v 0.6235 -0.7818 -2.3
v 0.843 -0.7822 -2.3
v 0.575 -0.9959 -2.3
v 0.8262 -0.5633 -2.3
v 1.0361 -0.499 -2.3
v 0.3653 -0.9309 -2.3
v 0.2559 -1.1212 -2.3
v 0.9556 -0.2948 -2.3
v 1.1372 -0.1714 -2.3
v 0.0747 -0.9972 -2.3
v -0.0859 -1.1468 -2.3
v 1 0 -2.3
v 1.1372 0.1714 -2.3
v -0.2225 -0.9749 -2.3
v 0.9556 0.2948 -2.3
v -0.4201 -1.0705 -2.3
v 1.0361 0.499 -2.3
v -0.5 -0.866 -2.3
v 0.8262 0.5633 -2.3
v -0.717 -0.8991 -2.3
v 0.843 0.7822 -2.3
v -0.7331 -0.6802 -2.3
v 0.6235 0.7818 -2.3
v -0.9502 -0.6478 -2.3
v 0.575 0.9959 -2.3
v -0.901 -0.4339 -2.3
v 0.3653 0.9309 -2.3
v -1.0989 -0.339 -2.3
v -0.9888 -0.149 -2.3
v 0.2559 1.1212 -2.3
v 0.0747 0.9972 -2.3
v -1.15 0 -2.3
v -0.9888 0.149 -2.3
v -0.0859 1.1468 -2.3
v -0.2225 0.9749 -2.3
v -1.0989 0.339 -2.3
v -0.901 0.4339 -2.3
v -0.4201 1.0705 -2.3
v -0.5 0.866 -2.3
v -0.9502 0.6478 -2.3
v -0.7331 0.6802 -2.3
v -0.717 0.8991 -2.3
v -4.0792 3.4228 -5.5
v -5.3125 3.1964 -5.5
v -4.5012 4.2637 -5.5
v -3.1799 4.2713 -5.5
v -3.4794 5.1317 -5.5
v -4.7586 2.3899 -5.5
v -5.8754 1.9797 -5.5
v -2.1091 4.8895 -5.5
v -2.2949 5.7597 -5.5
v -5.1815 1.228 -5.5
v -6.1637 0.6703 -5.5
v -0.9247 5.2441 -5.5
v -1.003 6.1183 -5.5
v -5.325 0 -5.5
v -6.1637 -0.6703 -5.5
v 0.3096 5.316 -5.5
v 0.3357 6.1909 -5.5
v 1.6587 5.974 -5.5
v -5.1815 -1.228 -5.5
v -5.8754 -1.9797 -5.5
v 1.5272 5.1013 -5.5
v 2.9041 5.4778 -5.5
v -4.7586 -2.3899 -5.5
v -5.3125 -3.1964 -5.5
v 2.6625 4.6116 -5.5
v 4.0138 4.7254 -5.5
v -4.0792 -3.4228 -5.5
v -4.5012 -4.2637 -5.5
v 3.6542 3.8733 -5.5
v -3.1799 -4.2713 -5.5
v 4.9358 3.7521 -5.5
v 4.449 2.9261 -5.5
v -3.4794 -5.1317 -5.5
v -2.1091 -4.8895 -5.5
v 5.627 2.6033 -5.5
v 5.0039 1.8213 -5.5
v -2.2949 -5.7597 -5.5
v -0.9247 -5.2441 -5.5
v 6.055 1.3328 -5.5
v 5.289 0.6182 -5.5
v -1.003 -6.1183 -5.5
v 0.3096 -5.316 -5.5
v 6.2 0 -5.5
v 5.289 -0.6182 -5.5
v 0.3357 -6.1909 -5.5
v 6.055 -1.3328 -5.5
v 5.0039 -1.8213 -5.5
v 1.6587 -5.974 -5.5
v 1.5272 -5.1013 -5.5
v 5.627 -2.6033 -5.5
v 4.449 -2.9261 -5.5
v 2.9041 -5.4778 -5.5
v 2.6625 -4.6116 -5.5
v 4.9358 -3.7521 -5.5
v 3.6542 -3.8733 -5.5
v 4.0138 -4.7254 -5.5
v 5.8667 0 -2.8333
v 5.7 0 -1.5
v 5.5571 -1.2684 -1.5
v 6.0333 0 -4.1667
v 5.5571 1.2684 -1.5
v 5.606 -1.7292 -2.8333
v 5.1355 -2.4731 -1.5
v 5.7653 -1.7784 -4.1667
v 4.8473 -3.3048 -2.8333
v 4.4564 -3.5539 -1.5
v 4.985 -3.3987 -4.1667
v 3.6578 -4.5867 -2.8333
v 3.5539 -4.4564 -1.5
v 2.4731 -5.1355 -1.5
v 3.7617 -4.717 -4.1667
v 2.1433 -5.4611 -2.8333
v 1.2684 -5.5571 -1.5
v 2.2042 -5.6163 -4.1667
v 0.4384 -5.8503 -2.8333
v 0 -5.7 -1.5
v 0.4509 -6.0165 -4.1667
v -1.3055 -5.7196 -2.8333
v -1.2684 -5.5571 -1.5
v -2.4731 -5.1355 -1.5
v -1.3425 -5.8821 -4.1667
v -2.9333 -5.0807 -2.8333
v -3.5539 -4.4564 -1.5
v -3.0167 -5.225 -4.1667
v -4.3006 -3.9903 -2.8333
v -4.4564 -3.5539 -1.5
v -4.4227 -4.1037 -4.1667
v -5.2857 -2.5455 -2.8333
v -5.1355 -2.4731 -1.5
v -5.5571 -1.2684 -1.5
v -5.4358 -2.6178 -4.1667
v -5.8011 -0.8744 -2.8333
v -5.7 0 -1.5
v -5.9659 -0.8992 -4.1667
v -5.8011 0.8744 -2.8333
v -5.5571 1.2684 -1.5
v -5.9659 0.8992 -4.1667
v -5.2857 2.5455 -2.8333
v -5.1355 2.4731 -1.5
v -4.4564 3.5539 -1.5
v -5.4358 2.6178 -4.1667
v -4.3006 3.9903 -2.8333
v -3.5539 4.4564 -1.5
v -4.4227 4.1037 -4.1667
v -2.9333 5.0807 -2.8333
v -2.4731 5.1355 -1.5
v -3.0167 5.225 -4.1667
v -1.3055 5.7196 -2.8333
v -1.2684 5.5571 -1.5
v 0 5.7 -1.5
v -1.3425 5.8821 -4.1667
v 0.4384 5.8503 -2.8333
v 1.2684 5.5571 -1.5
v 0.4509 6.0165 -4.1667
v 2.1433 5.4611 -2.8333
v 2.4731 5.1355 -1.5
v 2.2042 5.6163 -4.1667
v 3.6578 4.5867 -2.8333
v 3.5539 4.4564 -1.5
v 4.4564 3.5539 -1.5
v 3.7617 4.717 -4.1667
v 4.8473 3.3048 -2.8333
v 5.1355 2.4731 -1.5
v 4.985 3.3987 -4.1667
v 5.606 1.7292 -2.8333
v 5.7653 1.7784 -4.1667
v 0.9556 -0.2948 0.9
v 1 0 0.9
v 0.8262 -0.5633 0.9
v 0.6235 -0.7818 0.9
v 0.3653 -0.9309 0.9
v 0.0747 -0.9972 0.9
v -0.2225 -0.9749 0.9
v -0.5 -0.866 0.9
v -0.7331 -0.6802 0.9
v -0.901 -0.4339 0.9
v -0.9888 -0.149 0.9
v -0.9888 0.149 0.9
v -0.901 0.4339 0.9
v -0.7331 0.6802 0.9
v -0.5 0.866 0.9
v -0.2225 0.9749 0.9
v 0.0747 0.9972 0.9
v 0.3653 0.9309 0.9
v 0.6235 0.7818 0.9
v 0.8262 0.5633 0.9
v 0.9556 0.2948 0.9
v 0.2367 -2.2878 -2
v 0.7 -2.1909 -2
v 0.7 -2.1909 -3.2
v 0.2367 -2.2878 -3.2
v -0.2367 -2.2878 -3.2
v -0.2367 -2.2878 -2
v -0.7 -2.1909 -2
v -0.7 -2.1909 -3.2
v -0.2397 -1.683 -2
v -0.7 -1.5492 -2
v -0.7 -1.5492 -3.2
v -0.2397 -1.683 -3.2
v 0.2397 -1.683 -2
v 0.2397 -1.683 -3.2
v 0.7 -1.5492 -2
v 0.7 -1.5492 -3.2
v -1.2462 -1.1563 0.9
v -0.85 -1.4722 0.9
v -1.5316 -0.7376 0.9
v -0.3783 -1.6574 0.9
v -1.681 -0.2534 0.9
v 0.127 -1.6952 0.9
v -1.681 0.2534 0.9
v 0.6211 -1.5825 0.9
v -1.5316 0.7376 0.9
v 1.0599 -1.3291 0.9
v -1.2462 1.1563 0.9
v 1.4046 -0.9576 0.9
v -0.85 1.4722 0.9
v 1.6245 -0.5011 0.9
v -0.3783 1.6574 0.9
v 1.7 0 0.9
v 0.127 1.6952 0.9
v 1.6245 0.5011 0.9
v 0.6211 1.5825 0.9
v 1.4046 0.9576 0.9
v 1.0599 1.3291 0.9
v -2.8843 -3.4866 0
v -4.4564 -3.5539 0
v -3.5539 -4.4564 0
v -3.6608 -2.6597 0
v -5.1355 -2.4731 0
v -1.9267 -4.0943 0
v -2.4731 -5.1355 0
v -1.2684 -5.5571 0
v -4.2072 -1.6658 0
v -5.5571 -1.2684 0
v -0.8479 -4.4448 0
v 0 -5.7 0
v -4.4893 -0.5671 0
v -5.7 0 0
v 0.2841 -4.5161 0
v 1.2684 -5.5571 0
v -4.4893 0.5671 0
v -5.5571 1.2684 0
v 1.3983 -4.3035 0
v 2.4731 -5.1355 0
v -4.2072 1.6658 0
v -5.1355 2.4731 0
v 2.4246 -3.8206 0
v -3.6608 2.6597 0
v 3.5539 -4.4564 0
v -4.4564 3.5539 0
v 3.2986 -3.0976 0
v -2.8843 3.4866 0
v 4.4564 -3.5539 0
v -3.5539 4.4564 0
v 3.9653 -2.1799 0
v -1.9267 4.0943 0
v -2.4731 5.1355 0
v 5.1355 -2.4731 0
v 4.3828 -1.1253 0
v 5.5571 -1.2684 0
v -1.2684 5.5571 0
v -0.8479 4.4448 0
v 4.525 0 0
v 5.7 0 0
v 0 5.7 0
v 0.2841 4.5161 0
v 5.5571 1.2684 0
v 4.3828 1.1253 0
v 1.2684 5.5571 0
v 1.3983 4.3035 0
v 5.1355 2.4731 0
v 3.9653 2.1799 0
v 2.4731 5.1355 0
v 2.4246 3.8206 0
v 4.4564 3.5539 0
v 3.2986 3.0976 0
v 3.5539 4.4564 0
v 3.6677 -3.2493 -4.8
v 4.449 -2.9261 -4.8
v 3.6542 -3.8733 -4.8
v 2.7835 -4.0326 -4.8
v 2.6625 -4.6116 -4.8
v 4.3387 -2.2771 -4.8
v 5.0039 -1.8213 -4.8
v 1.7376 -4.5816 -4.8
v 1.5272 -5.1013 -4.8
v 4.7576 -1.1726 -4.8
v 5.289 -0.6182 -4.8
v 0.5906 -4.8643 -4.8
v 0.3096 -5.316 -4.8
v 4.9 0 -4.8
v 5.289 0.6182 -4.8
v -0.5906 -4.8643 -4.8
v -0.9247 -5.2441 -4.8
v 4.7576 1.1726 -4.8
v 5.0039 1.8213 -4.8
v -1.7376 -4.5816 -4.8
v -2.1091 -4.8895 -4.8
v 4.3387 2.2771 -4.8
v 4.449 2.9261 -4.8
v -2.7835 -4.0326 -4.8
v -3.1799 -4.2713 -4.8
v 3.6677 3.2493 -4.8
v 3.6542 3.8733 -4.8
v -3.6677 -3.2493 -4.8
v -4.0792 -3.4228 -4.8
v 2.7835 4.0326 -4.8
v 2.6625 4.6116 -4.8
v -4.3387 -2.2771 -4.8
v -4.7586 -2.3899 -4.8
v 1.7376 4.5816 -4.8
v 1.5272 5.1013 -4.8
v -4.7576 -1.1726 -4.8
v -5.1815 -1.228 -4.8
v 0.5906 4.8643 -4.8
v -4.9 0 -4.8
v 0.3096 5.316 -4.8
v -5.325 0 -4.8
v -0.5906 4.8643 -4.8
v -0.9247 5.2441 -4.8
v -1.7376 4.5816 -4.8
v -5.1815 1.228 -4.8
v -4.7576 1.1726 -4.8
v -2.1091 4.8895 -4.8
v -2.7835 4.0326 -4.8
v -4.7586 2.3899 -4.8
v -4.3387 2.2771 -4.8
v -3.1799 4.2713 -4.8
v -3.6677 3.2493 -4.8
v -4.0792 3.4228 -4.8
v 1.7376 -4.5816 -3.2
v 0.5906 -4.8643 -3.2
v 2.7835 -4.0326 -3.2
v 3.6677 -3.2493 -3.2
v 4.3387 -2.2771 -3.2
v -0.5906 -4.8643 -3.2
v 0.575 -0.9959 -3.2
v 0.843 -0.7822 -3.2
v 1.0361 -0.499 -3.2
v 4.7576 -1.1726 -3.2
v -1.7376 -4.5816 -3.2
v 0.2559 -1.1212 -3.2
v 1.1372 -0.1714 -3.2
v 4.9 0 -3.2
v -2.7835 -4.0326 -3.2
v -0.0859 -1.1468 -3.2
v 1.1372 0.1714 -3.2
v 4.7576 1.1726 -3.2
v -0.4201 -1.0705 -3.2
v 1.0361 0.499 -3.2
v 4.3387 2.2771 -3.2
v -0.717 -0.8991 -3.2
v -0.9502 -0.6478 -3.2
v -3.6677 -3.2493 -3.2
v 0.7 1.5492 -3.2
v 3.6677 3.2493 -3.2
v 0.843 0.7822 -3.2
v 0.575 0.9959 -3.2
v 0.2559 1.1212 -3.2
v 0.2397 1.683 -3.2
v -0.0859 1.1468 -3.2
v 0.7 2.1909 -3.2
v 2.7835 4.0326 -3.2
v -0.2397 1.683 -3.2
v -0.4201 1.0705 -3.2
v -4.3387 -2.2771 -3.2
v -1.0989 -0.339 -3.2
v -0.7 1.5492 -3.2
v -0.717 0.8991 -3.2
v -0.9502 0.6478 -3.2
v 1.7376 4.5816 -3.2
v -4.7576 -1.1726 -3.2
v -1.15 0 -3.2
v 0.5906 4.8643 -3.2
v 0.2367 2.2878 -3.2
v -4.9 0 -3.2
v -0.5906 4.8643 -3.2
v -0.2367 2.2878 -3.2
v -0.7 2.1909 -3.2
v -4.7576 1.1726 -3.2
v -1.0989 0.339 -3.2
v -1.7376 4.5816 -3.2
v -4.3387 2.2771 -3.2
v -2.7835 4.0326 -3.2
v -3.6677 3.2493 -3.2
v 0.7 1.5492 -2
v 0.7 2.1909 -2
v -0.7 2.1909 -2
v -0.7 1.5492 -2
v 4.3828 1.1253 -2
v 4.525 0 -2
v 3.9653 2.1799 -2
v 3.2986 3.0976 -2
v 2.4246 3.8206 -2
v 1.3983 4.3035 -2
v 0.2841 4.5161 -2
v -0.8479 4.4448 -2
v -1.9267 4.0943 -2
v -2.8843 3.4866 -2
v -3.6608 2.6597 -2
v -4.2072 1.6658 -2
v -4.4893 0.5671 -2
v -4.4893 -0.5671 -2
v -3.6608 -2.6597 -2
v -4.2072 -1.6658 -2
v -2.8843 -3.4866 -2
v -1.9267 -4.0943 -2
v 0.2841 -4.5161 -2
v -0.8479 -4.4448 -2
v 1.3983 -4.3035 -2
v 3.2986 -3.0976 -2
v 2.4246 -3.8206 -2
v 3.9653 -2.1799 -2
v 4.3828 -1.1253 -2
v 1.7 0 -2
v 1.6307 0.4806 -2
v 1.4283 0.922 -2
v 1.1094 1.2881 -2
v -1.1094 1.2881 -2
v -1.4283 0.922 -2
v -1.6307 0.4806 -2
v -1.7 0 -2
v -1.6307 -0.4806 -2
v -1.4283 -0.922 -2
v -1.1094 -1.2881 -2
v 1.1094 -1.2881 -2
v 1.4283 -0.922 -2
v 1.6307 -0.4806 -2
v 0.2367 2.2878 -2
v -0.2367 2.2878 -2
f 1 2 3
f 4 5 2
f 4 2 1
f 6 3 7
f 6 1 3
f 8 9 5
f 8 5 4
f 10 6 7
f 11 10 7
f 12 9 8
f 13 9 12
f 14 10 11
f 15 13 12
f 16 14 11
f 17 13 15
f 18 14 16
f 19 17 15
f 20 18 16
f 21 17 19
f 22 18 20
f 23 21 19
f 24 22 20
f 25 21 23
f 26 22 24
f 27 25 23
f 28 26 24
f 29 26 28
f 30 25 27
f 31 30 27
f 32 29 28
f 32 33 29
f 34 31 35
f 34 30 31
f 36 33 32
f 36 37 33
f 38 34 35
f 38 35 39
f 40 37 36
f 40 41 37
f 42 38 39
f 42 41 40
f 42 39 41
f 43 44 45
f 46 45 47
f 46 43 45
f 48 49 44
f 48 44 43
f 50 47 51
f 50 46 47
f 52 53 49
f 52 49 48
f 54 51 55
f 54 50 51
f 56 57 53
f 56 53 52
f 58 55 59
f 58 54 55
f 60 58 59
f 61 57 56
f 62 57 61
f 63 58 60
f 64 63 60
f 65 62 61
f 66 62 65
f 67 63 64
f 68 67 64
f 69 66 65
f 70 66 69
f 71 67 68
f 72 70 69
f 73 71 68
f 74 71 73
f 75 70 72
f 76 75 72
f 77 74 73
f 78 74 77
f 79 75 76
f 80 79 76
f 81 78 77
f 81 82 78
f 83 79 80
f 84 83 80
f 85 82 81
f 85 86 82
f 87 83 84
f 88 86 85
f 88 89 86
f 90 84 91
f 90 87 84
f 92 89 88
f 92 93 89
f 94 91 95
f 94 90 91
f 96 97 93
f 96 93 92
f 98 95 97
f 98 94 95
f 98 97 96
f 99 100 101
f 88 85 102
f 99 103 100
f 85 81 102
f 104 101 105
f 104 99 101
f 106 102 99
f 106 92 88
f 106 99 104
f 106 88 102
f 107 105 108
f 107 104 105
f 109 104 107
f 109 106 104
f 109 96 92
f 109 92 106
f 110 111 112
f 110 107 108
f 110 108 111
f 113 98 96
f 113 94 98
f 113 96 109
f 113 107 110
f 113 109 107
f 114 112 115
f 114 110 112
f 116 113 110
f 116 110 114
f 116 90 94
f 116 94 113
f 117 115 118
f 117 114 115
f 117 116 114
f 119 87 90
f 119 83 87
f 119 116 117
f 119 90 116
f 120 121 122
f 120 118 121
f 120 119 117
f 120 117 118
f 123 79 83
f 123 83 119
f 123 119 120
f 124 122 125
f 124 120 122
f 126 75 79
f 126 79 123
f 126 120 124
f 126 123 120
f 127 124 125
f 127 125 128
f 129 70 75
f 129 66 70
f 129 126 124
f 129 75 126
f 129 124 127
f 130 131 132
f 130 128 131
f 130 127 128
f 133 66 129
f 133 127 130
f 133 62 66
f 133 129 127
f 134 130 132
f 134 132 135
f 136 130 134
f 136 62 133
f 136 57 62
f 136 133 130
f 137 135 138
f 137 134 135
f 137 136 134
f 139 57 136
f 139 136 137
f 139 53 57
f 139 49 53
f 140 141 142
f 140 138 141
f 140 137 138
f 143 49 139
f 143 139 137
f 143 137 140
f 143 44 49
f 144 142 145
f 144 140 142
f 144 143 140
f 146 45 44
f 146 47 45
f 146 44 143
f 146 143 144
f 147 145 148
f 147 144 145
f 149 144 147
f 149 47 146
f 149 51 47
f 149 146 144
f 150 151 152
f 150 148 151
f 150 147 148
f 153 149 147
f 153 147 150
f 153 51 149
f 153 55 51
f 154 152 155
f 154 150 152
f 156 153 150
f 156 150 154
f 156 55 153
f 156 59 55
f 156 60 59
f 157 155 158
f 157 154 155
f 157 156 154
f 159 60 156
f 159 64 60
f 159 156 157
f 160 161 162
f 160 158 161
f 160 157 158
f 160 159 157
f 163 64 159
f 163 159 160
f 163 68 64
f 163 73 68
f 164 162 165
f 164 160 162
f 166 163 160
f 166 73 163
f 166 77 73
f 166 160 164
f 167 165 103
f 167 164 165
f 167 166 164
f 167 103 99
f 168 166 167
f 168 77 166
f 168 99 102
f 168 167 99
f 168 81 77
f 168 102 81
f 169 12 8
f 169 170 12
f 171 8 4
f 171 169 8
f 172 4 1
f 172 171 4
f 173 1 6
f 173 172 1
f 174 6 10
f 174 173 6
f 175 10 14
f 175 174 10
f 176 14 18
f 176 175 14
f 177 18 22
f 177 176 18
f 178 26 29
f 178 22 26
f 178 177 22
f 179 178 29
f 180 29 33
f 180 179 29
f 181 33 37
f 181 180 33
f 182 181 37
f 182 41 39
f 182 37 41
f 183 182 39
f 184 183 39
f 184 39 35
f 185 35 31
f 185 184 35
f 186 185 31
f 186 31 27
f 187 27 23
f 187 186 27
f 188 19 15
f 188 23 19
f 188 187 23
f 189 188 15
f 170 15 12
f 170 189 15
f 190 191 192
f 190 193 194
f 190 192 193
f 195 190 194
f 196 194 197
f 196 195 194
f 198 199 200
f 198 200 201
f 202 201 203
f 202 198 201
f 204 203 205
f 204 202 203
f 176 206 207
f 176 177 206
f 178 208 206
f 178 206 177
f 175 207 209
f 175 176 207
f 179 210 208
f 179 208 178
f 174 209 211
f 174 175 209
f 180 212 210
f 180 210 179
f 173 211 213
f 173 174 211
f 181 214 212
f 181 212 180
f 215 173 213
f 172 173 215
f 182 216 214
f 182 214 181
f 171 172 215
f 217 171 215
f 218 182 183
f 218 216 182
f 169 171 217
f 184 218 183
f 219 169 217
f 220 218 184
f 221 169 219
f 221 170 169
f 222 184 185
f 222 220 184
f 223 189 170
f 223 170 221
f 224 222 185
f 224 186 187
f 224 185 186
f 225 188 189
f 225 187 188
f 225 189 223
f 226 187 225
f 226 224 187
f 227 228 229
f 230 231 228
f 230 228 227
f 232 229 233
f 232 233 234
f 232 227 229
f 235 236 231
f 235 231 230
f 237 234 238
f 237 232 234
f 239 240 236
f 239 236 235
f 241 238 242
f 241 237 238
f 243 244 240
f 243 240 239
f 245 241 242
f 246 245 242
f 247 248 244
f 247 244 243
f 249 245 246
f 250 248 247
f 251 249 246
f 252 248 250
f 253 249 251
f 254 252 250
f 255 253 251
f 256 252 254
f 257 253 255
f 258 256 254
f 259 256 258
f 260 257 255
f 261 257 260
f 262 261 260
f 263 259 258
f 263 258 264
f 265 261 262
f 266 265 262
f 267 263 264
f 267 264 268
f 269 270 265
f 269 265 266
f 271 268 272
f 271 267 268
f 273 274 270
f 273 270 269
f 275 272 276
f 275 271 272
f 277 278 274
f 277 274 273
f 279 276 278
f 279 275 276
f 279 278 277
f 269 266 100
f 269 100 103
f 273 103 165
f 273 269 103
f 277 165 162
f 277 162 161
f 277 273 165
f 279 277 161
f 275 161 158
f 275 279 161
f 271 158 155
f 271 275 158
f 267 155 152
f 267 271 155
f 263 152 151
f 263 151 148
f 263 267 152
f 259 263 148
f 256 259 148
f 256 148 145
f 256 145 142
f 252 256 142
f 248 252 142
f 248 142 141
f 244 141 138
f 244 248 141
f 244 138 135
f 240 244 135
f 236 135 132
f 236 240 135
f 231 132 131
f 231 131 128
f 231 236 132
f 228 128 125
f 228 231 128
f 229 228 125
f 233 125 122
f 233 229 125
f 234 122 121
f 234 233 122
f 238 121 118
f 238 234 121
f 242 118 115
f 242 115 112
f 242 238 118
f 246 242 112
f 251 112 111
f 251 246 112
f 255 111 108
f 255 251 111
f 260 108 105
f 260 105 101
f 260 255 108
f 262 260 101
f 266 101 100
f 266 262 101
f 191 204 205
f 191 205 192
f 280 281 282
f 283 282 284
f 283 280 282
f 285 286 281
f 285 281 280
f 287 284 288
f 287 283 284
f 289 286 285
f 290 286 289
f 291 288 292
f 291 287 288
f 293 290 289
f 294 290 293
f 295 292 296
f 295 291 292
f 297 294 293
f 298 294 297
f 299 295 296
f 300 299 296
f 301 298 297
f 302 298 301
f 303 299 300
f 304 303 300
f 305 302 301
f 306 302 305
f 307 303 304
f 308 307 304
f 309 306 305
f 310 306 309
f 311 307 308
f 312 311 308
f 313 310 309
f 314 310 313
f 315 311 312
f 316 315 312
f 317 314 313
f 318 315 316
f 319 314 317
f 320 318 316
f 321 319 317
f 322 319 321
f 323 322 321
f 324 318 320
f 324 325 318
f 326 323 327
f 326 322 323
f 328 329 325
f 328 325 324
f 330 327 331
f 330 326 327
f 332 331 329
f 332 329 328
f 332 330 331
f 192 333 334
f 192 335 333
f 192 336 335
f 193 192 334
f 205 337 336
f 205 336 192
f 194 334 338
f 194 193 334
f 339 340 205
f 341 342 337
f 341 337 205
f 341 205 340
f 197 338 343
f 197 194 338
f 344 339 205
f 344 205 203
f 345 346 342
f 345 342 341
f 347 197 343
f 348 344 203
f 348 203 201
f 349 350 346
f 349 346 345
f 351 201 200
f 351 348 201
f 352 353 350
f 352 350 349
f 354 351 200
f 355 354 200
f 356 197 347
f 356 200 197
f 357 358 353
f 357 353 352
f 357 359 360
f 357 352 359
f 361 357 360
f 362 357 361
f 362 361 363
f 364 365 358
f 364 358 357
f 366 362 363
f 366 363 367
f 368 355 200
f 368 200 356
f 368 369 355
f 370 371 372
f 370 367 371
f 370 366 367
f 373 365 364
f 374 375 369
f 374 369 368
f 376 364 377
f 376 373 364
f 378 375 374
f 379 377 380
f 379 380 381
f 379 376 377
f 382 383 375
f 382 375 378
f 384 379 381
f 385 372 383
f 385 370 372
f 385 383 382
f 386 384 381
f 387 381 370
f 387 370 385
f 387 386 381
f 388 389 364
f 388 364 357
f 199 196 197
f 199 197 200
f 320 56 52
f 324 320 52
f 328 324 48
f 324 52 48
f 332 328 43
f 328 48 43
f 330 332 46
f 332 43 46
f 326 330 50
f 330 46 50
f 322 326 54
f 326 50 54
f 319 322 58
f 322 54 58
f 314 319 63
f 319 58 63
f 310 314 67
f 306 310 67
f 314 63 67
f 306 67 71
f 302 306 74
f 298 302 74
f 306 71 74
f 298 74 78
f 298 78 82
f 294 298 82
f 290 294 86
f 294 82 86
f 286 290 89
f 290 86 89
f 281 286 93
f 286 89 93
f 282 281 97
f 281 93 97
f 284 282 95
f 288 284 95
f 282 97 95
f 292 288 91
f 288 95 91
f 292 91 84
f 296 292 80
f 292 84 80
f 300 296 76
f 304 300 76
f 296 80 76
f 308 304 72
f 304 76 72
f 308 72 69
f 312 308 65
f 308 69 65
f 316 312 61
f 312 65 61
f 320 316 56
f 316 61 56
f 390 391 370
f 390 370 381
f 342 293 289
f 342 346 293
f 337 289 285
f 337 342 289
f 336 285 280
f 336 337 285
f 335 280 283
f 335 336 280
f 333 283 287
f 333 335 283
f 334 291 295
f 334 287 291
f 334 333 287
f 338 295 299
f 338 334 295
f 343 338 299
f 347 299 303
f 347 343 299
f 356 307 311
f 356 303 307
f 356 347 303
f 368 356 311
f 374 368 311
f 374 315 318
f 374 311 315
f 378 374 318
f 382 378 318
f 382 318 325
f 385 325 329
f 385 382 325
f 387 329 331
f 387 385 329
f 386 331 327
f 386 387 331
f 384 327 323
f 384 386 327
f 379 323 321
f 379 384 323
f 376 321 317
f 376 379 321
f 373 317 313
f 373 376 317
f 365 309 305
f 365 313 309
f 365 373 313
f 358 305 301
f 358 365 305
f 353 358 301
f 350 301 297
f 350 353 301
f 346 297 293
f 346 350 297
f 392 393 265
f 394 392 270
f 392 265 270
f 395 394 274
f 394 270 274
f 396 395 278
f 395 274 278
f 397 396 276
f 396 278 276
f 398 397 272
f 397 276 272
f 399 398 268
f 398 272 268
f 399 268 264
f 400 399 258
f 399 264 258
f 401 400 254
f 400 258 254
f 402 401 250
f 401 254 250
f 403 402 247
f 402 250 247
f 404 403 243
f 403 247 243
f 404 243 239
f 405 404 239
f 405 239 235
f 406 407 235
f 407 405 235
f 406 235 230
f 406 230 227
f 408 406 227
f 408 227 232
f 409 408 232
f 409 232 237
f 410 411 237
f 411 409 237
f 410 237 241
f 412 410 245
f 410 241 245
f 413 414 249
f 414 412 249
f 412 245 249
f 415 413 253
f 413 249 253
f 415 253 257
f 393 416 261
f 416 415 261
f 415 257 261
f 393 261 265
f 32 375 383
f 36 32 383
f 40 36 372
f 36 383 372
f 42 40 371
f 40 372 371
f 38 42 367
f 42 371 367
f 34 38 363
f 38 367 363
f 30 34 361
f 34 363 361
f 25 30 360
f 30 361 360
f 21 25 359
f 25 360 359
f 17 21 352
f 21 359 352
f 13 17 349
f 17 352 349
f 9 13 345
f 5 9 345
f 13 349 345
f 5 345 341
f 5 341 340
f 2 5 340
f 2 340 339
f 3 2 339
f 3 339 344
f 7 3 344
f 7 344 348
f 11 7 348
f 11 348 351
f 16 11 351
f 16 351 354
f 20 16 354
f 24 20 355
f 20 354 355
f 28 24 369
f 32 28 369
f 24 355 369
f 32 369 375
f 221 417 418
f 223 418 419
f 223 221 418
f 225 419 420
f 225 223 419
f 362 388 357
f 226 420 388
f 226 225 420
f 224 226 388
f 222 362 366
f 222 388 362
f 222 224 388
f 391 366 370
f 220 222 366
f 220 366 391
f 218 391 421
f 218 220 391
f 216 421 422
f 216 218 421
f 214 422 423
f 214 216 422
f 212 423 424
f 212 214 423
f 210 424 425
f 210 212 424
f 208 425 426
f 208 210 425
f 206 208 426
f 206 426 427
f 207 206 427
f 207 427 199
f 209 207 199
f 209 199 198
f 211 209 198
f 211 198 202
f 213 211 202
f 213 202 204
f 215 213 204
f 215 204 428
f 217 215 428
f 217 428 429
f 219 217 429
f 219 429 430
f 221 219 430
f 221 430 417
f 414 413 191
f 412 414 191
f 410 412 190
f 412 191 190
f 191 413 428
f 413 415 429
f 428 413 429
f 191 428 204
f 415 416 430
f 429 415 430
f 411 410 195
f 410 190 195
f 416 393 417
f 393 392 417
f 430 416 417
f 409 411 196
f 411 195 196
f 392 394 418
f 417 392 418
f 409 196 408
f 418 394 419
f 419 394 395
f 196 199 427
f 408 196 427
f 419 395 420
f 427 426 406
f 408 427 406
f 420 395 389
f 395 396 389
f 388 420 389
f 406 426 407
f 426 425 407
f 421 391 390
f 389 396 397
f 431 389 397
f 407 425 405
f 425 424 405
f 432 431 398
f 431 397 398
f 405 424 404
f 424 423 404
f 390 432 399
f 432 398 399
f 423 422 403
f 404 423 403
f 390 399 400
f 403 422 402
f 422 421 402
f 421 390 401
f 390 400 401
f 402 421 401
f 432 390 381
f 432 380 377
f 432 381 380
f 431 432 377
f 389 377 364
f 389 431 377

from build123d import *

# Parameters (mm, degrees)
SKETCH_1_R           = 1.7
SKETCH_1_R_2         = 1
EXTRUDE_1_DEPTH      = 0.9
EXTRUDE_1_DEPTH_BACK = 2
SKETCH_1_3_R         = 5.7
SKETCH_1_3_R_2       = 4.525
EXTRUDE_2_DEPTH      = 1.5
SKETCH_2_R           = 5
EXTRUDE_3_DEPTH      = 1.2
SKETCH_2_5_R         = 1
CUT_EXTRUDE_3_DEPTH  = 2.2
SKETCH_6_R           = 1.15
CUT_EXTRUDE_4_DEPTH  = 0.9
SKETCH_4_W           = 0.5
SKETCH_4_H           = 0.375
SKETCH_7_R           = 5.325
CUT_EXTRUDE_5_DEPTH  = 0.7


with BuildPart() as part:
    # Sketch 1 → Extrude 1 (new body, two sides)
    with BuildSketch(Plane.XY) as extrude_1_sk:
        Circle(SKETCH_1_R)
        Circle(SKETCH_1_R_2, mode=Mode.SUBTRACT)
    extrude(amount=EXTRUDE_1_DEPTH)
    extrude(extrude_1_sk.sketch, amount=-EXTRUDE_1_DEPTH_BACK)

    # Sketch 2 → Extrude 3 (add)
    with BuildSketch(Plane(origin=(0, 0, -2), x_dir=(-1, 0, 0), z_dir=(0, 0, -1))):
        Circle(SKETCH_2_R)
    extrude(amount=EXTRUDE_3_DEPTH)

    # Sketch 2_5 → Cut-Extrude 3 (cut, through all)
    with BuildSketch(Plane(origin=(0, 0, -2), x_dir=(-1, 0, 0), z_dir=(0, 0, -1))):
        with BuildLine():
            Line((-0.7, -1.549193338), (-0.7, -2.19089023))
            ThreePointArc((-0.7, -2.19089023), (0, -2.3), (0.7, -2.19089023))
            Line((0.7, -2.19089023), (0.7, -1.549193338))
            ThreePointArc((0.7, -1.549193338), (0, -1.7), (-0.7, -1.549193338))
        make_face()
        with BuildLine():
            ThreePointArc((0.7, 2.19089023), (0, 2.3), (-0.7, 2.19089023))
            Line((-0.7, 2.19089023), (-0.7, 1.549193338))
            ThreePointArc((-0.7, 1.549193338), (0, 1.7), (0.7, 1.549193338))
            Line((0.7, 1.549193338), (0.7, 2.19089023))
        make_face()
        with BuildLine():
            Line((-0.7, -1.549193338), (-0.7, -2.19089023))
            ThreePointArc((-0.7, -2.19089023), (0, -2.3), (0.7, -2.19089023))
            Line((0.7, -2.19089023), (0.7, -1.549193338))
            ThreePointArc((0.7, -1.549193338), (0, -1.7), (-0.7, -1.549193338))
        make_face()
        with BuildLine():
            ThreePointArc((0.7, 2.19089023), (0, 2.3), (-0.7, 2.19089023))
            Line((-0.7, 2.19089023), (-0.7, 1.549193338))
            ThreePointArc((-0.7, 1.549193338), (0, 1.7), (0.7, 1.549193338))
            Line((0.7, 1.549193338), (0.7, 2.19089023))
        make_face()
        with Locations(Location((0, 0, 0), (0, 0, 180))):  # turned: the seam where the file's is
            Circle(SKETCH_2_5_R)
    extrude(amount=CUT_EXTRUDE_3_DEPTH, mode=Mode.SUBTRACT)

    # Sketch 6 → Cut-Extrude 4 (cut)
    with BuildSketch(Plane(origin=(0, 0, -3.2), x_dir=(-1, 0, 0), z_dir=(0, 0, -1))):
        Circle(SKETCH_6_R)
    extrude(amount=-CUT_EXTRUDE_4_DEPTH, mode=Mode.SUBTRACT)



with BuildPart() as body_2:
    # Sketch 1_3 → Extrude 2 (new body)
    with BuildSketch(Plane.XY):
        Circle(SKETCH_1_3_R)
        Circle(SKETCH_1_3_R_2, mode=Mode.SUBTRACT)
    extrude(amount=-EXTRUDE_2_DEPTH)


with BuildPart() as part_1:
    add(part.part)

    add(body_2.part)  # Revolve 2 merges body 2
    # Sketch 4 → Revolve 2 (revolve)
    with BuildSketch(Plane(origin=(0, 0, 0), x_dir=(0, 0, -1), z_dir=(1, 0, 0)), mode=Mode.PRIVATE) as revolve_2_sk:
        Polygon((1.5, 5.7), (5.5, 6.2), (5.5, 4.9), (1.5, 4.9), align=None)
        with Locations((1.75, 4.7125)):
            Rectangle(SKETCH_4_W, SKETCH_4_H)
    revolve(revolve_2_sk.sketch.rotate(Axis((0, 0, 1000), (0, 0, -1)), 90), axis=Axis((0, 0, 1000), (0, 0, -1)))  # turned: the seam where the file's is

    # Sketch 7 → Cut-Extrude 5 (cut)
    with BuildSketch(Plane(origin=(0, 0, -5.5), x_dir=(-1, 0, 0), z_dir=(0, 0, -1))):
        Circle(SKETCH_7_R)
    extrude(amount=-CUT_EXTRUDE_5_DEPTH, mode=Mode.SUBTRACT)


solid = part_1.part
